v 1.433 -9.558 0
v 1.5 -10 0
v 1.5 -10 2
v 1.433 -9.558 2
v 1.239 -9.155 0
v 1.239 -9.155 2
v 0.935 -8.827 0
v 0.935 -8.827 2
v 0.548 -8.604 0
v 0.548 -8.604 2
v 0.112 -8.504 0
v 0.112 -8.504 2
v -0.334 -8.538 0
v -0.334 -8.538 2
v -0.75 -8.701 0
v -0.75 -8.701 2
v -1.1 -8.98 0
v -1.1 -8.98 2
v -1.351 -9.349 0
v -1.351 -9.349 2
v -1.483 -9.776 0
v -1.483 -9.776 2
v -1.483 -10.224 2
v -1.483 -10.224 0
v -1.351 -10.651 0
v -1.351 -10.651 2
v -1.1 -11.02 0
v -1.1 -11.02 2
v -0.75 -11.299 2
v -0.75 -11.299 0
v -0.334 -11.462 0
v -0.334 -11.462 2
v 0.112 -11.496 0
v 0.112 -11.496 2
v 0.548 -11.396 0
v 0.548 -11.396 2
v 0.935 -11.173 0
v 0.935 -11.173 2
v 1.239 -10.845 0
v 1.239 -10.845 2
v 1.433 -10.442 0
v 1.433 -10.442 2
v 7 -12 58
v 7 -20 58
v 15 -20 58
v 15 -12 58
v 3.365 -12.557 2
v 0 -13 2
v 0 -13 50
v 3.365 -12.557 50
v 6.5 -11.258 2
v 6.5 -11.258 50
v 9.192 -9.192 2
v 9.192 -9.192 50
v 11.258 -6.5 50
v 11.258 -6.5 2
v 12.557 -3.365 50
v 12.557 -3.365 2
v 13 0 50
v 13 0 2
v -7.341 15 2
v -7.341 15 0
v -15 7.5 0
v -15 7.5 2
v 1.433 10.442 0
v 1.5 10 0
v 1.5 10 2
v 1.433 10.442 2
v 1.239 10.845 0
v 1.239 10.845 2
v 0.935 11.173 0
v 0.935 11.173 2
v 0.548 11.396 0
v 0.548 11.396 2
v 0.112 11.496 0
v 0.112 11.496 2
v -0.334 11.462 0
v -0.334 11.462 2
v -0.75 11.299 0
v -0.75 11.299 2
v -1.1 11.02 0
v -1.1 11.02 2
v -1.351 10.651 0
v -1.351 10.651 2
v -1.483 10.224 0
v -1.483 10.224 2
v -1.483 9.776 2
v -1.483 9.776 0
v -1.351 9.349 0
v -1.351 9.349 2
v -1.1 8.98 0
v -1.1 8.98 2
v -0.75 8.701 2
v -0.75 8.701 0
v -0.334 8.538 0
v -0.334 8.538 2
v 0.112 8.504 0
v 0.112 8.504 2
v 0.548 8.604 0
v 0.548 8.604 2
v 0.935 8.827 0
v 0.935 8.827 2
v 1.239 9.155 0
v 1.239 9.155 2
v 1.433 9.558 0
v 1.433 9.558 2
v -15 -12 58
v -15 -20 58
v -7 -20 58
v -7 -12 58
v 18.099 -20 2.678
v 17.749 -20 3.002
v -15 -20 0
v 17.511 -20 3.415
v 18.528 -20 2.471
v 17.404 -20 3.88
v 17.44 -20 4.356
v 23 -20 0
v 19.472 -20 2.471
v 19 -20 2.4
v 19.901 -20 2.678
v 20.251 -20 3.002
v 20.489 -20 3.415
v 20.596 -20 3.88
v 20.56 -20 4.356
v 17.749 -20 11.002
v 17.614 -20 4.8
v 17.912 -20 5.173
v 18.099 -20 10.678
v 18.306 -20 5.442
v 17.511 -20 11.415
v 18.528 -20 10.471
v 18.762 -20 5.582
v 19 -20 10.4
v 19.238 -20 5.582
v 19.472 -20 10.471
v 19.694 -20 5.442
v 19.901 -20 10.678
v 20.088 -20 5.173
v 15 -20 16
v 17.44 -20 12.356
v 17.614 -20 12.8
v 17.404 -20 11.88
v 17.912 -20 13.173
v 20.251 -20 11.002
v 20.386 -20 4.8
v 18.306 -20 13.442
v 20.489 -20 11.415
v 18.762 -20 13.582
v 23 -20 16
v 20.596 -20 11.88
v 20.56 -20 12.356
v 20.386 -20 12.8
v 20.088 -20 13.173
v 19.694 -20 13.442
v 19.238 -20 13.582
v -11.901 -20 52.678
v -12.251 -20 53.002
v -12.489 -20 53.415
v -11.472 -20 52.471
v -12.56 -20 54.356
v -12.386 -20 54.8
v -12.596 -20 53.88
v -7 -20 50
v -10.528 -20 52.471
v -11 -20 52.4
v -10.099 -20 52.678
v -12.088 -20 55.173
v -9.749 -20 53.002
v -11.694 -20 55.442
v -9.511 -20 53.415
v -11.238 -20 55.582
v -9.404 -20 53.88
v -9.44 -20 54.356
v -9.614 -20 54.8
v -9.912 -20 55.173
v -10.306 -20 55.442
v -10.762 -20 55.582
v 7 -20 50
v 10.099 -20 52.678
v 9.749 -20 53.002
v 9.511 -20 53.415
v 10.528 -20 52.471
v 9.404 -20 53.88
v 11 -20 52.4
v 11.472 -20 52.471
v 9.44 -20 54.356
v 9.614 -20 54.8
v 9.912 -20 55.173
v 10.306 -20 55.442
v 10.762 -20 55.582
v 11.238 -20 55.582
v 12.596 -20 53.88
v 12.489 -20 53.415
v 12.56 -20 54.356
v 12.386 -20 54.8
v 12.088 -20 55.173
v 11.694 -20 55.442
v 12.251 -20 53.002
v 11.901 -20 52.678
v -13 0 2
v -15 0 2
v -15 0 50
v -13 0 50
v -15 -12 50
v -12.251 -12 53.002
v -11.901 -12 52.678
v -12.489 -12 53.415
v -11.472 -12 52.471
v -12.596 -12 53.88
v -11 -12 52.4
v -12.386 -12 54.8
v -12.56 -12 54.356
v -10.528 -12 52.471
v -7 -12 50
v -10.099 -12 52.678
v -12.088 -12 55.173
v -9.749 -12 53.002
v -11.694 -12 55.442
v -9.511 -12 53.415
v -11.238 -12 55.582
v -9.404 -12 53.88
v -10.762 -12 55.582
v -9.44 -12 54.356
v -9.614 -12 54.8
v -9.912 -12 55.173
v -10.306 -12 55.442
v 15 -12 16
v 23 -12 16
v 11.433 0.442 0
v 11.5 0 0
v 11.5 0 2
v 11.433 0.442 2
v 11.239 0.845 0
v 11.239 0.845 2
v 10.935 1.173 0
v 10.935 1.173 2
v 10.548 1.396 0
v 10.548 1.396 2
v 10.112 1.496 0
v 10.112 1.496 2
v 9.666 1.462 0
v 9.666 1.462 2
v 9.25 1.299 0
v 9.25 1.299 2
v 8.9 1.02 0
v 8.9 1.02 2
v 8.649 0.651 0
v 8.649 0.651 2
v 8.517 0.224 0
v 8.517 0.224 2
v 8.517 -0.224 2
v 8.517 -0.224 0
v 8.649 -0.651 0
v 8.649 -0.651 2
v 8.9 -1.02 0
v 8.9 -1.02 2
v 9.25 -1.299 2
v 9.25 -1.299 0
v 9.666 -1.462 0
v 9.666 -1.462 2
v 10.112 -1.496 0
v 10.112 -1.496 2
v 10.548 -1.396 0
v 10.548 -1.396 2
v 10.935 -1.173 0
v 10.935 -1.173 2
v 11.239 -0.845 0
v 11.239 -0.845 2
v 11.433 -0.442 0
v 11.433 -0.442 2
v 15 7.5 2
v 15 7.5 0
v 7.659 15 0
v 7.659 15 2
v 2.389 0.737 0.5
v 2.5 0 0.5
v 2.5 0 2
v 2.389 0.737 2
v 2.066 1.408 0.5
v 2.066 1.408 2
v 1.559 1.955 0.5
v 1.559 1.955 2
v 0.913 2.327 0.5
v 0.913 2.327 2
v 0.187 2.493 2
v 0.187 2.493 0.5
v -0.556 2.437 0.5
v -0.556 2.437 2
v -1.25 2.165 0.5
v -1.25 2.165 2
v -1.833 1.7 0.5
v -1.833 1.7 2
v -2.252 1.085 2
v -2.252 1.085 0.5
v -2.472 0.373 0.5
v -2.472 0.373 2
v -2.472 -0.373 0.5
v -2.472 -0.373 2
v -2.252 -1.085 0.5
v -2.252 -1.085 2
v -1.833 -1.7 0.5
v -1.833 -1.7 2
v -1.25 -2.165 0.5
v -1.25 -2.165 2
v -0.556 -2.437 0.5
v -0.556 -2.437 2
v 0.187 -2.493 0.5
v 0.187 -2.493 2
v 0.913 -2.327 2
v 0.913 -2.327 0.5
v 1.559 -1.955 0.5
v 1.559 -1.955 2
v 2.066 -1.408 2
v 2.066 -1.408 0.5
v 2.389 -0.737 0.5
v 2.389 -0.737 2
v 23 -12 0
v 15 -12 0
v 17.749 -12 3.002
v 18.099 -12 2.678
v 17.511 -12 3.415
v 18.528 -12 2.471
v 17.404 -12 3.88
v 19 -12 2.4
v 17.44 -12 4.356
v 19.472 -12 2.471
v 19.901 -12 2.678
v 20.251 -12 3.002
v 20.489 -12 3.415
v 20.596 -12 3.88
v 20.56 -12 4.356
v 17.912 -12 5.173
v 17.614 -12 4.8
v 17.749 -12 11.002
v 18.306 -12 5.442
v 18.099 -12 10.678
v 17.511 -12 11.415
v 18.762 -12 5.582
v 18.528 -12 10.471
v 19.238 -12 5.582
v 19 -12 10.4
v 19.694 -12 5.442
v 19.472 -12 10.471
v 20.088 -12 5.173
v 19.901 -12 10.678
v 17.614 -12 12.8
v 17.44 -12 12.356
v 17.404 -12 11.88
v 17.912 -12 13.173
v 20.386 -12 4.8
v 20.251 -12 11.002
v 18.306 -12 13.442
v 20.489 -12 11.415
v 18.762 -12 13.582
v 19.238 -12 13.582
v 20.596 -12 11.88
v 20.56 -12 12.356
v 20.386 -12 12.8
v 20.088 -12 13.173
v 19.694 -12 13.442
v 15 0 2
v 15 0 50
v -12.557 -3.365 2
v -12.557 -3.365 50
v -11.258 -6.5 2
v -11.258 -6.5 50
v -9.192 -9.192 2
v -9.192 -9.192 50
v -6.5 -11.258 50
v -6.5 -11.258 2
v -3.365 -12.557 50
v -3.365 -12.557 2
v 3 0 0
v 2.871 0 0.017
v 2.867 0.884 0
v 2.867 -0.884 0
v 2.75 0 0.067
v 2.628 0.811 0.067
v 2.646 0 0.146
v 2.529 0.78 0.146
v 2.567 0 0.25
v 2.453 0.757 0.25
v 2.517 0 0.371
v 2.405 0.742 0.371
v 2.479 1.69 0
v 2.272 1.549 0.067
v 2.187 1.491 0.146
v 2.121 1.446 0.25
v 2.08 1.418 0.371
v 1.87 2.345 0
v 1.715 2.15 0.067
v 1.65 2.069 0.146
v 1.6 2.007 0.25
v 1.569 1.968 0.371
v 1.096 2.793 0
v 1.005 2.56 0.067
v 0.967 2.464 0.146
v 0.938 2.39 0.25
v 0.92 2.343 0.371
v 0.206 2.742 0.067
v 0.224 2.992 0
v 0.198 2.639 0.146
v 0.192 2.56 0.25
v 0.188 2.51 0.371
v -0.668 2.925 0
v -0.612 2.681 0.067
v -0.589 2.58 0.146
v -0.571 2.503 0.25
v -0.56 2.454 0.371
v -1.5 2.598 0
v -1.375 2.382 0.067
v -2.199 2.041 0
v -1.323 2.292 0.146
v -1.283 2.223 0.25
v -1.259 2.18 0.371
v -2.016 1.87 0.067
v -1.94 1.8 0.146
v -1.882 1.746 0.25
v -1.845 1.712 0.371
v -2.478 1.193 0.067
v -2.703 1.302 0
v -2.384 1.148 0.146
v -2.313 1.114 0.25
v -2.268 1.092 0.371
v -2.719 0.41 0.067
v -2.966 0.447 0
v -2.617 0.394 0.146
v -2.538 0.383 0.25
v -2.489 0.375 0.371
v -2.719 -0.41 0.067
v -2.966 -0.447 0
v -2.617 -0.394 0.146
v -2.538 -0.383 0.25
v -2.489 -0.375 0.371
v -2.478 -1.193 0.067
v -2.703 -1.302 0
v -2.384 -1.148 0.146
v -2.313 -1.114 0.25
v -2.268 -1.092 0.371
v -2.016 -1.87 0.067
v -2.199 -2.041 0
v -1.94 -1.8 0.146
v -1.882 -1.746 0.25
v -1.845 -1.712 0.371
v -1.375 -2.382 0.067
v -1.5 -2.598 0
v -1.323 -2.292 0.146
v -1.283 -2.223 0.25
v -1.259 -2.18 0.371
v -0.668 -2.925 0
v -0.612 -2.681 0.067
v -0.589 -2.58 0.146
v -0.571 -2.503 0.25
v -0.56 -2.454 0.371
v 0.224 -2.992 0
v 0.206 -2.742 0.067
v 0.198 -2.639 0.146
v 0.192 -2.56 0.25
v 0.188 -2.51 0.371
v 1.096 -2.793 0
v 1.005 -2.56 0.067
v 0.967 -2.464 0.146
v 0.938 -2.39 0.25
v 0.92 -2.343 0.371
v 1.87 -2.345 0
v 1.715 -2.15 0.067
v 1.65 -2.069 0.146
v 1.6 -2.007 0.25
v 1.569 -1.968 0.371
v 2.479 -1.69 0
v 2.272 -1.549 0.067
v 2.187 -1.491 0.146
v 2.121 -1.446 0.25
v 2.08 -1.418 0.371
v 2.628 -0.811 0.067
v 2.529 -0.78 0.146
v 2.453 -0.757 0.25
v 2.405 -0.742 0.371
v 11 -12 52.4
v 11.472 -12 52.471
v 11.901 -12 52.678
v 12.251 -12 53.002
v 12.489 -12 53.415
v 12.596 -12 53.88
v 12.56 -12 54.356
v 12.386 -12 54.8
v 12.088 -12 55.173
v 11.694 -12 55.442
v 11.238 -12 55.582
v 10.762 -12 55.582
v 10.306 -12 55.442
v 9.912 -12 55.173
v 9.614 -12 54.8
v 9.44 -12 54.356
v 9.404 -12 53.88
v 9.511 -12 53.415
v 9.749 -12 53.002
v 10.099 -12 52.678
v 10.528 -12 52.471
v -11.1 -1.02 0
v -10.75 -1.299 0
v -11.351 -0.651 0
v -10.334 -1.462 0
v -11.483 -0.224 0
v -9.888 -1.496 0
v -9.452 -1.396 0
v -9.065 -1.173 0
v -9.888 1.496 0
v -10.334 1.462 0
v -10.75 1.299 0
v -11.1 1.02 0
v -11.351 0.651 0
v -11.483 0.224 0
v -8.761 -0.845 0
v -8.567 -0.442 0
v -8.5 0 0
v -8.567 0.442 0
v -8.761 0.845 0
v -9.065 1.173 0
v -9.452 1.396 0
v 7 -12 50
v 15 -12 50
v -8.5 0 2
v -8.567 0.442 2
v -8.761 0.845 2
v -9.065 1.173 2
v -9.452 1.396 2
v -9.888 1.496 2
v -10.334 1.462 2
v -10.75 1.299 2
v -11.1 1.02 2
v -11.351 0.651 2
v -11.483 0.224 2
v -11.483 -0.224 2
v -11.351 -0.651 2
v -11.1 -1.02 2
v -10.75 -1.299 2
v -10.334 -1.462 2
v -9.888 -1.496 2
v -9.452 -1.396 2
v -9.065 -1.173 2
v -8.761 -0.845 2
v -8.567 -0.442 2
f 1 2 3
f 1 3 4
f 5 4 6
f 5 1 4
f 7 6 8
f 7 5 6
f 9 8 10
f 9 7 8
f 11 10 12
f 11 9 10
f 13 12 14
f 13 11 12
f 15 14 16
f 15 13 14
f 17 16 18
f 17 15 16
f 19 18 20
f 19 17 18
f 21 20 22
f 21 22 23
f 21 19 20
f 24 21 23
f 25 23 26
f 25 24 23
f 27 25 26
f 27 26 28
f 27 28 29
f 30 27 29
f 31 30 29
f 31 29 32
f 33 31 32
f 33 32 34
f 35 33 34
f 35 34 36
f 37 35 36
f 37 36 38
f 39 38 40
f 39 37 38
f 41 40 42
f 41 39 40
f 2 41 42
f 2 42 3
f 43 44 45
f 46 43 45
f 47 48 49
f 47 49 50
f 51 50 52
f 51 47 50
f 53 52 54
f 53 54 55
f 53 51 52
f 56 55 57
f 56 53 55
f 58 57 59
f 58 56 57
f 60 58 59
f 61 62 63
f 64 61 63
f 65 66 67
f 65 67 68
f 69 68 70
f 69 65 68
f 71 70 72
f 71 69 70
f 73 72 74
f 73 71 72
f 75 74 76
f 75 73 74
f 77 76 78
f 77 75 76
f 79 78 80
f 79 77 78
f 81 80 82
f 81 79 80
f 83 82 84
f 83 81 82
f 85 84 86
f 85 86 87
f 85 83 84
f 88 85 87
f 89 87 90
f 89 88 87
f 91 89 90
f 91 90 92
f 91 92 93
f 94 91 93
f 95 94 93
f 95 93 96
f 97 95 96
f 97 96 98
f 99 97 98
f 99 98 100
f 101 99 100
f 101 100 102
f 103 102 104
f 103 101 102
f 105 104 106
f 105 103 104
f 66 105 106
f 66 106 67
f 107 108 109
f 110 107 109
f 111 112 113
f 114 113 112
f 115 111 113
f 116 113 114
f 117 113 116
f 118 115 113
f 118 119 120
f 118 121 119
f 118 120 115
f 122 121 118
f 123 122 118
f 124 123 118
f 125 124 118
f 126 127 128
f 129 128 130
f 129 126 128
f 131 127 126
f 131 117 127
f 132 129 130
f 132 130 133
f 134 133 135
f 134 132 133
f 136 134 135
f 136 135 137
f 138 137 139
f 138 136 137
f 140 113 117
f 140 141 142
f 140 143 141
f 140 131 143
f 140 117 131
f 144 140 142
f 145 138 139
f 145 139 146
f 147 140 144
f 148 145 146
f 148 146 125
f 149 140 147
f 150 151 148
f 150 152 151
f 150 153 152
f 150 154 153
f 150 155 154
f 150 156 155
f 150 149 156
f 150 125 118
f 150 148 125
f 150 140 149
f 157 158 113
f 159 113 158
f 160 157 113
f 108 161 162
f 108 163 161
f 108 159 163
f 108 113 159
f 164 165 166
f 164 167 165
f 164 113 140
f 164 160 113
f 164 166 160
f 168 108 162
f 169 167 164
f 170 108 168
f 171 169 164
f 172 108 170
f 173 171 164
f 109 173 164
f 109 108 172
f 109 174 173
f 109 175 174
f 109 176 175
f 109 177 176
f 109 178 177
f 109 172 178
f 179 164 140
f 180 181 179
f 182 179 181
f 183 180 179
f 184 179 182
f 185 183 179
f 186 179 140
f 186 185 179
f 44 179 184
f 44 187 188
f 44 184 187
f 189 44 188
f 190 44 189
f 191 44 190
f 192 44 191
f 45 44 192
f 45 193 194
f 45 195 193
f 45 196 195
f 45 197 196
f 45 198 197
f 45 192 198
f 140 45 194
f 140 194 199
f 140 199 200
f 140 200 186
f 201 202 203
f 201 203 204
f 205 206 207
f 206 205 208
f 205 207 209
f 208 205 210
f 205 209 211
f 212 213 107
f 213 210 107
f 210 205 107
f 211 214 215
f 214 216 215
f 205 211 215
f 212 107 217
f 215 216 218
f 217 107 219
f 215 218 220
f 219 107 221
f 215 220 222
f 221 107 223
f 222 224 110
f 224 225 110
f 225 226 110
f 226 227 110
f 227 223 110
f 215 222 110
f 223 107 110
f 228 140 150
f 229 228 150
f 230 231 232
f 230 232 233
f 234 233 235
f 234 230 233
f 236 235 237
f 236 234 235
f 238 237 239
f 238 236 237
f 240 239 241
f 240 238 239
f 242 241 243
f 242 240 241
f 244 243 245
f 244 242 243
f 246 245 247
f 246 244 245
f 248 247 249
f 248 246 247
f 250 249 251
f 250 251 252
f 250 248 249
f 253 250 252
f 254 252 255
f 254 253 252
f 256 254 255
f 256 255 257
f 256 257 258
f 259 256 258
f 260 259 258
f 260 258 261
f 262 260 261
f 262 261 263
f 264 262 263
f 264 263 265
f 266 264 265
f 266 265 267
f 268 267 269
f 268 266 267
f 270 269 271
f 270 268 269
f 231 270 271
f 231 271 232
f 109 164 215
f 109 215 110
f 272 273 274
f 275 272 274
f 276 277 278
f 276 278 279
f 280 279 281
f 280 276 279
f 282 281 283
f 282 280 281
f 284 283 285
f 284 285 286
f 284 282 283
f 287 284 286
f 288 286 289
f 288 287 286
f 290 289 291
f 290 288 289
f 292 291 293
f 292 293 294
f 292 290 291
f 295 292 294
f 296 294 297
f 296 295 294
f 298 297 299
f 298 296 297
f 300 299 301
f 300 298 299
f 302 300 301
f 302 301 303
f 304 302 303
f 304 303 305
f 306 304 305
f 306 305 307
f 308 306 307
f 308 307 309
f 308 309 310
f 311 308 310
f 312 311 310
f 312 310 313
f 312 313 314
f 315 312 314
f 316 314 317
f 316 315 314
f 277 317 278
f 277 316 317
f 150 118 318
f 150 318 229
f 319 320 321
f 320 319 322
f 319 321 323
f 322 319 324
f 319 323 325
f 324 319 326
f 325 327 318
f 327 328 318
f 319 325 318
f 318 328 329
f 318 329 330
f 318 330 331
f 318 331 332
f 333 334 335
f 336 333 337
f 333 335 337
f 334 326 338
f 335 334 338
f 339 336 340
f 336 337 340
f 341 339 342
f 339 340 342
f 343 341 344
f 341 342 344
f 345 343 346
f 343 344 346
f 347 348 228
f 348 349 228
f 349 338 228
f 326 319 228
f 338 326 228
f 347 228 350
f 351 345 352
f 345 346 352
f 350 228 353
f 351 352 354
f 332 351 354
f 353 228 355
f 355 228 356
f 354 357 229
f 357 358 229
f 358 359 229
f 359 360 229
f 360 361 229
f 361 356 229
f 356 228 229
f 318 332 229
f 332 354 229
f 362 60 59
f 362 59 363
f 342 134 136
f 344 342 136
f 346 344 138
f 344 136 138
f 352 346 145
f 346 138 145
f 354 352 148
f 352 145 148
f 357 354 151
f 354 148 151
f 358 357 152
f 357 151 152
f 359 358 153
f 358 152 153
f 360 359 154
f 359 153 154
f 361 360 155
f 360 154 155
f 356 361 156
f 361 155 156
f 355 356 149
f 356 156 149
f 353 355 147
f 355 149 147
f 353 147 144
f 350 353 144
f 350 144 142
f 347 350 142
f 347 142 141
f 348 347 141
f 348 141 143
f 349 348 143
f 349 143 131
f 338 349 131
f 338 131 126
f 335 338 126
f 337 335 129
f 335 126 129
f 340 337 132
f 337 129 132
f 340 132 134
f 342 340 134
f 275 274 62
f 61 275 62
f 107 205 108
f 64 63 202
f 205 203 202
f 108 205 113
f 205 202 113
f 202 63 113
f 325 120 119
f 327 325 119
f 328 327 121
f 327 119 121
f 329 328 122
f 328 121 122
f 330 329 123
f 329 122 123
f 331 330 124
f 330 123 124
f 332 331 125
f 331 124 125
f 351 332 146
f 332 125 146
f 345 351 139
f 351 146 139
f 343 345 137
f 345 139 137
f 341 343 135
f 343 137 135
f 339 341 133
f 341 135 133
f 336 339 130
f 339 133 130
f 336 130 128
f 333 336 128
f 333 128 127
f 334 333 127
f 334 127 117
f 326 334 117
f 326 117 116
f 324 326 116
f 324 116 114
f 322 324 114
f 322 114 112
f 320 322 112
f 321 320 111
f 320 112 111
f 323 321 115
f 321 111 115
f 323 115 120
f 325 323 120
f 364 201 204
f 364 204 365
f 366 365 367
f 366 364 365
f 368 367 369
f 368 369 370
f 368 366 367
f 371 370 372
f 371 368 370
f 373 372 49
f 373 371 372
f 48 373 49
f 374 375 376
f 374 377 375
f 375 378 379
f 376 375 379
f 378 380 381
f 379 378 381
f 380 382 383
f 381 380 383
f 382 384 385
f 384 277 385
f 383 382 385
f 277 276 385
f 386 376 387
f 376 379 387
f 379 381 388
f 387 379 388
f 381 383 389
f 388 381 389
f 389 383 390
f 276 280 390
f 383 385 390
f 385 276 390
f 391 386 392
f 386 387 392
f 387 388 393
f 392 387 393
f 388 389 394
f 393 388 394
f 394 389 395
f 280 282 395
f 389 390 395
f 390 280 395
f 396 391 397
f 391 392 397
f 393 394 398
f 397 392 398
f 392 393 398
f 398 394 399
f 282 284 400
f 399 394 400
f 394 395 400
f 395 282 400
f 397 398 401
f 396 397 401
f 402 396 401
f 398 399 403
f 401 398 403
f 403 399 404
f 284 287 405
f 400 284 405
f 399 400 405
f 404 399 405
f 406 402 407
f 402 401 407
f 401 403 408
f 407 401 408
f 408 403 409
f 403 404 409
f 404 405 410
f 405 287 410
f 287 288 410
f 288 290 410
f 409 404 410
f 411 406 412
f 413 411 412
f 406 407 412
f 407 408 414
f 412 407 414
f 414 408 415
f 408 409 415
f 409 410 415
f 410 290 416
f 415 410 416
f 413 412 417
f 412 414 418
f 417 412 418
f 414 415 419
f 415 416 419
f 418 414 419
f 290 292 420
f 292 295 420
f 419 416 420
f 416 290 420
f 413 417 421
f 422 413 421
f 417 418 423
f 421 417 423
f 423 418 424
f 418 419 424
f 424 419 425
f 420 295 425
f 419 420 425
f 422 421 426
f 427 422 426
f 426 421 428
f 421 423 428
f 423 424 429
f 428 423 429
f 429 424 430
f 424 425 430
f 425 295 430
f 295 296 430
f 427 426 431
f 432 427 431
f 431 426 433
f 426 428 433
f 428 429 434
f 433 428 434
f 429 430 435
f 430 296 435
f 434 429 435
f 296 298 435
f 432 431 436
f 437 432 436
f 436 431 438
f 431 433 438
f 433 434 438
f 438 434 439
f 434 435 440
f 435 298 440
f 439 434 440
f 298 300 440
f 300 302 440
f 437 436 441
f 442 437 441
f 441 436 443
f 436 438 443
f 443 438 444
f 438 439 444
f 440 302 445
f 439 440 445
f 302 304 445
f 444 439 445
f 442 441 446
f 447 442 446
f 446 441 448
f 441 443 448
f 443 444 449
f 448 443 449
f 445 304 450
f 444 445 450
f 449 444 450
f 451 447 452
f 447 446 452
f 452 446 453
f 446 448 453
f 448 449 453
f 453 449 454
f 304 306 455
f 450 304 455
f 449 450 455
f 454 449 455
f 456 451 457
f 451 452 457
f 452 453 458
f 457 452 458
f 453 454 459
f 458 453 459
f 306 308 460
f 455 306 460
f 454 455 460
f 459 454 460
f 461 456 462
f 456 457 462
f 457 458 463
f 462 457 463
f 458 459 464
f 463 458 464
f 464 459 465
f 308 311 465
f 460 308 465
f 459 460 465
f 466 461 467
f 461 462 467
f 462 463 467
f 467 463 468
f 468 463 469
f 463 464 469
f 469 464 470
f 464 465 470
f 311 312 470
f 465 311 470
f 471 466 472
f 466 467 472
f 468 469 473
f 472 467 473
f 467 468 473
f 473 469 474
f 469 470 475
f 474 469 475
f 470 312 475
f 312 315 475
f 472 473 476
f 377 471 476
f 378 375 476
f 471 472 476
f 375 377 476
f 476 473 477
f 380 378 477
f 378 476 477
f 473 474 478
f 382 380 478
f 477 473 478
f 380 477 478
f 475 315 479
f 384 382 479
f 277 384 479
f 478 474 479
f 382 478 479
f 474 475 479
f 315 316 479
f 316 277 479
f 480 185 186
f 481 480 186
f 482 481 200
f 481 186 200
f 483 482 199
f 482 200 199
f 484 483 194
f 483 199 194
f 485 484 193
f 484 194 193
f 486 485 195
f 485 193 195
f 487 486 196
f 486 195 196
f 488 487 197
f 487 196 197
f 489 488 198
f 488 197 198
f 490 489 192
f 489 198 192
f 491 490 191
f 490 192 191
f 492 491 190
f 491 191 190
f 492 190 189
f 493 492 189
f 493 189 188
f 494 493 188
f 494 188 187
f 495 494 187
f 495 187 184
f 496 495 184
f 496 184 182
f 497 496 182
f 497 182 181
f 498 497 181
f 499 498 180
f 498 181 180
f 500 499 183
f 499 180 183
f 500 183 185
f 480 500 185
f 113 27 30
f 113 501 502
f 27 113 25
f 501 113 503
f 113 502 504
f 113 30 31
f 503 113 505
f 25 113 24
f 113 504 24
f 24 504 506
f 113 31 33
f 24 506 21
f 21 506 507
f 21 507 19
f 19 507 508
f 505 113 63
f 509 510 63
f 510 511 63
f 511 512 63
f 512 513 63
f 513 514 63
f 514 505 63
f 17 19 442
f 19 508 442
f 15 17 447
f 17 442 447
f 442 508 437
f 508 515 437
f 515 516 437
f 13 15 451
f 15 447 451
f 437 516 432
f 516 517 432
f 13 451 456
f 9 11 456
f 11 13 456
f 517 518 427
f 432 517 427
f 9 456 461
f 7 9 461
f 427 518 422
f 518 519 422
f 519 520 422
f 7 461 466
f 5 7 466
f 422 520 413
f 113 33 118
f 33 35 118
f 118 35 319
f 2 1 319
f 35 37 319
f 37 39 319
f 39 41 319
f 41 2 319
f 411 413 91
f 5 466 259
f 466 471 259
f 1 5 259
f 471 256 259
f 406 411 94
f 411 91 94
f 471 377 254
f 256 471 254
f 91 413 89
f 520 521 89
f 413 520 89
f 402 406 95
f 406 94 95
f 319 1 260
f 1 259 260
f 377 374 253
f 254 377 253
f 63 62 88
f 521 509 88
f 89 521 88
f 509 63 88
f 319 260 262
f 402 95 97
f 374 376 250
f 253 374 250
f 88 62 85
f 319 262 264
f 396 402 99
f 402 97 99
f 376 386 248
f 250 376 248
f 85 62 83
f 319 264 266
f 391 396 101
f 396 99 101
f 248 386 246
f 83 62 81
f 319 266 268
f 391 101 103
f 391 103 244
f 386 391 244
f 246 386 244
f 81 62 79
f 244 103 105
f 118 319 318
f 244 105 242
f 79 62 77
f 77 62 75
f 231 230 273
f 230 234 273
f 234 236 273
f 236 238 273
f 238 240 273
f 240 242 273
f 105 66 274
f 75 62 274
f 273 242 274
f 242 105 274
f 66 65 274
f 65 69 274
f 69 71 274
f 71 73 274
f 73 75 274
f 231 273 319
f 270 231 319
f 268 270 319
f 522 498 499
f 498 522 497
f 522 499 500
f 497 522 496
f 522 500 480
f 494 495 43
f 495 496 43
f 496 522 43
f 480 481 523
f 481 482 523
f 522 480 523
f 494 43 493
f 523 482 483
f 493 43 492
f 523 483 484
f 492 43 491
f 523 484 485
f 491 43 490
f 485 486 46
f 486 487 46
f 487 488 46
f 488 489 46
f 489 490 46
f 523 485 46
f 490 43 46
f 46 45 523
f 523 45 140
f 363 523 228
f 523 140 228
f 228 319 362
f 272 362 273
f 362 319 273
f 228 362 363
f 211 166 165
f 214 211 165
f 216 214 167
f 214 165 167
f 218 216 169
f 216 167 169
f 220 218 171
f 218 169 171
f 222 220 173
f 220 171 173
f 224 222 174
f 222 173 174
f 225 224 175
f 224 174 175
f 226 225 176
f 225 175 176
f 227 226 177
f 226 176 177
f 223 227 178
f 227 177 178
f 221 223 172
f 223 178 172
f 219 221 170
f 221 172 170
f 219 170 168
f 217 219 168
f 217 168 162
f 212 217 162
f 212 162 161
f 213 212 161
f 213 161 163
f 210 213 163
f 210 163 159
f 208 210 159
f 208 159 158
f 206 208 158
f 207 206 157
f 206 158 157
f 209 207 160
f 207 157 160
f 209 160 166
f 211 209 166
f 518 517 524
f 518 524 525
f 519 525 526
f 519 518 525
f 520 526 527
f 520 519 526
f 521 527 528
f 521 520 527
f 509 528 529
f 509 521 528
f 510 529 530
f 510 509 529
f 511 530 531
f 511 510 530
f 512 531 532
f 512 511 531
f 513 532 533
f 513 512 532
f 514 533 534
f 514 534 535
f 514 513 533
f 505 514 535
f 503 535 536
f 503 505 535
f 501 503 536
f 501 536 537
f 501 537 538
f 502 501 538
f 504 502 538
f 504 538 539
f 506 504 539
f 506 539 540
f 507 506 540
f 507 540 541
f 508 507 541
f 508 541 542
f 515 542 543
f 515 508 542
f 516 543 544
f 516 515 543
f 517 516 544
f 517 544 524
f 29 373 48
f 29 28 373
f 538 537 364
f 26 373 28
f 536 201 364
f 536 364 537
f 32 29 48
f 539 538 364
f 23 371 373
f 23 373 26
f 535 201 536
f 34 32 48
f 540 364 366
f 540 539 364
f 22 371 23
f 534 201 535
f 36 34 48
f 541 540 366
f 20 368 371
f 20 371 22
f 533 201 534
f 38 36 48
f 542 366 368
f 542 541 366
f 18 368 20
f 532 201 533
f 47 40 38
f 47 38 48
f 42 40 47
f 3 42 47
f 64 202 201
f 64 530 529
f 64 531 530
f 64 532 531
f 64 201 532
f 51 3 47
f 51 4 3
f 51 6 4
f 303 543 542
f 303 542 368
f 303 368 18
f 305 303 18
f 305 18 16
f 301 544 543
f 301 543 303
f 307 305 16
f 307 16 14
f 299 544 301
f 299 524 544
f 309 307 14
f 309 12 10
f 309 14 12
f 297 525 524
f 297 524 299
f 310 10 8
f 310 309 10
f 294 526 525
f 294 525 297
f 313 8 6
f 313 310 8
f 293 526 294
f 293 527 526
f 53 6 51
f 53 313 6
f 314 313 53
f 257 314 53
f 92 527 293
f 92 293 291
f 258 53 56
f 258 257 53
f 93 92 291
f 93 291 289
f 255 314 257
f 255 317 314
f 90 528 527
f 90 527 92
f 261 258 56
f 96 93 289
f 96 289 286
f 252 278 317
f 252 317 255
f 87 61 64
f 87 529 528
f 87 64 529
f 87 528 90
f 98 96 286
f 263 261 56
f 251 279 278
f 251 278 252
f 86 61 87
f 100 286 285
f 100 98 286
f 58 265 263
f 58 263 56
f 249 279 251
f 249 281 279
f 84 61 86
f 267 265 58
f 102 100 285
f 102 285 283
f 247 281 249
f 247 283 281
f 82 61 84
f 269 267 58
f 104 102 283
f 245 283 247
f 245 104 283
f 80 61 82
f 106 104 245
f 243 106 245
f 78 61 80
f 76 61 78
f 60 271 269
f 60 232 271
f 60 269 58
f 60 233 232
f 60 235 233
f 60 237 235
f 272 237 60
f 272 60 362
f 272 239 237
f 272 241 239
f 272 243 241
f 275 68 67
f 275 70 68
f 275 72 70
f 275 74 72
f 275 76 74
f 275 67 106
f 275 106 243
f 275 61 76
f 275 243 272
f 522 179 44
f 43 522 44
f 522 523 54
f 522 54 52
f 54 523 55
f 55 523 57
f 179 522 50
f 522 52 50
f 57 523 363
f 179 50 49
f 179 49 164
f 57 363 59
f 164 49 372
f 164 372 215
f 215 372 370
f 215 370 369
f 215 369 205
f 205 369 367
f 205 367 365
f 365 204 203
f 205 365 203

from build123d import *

# Parameters (mm, degrees)
ESQUISSE1_R        = 1.5
ESQUISSE1_R_2      = 2.5
BOSS_EXTRU_1_DEPTH = 2
BOSS_EXTRU_2_DEPTH = 50
CONG_1_R           = 0.5
ESQUISSE3_W        = 8
ESQUISSE3_H        = 8
ESQUISSE3_R        = 1.6
BOSS_EXTRU_4_DEPTH = 8


with BuildPart() as part:
    # Esquisse1 → Boss.-Extru.1 (new body)
    with BuildSketch(Plane.XY):
        with BuildLine():
            Line((-7.341000528, 15), (-15, 7.5))
            Line((-15, 7.5), (-15, 0))
            Line((-15, 0), (-13, 0))
            ThreePointArc((-13, 0), (0, -13), (13, 0))
            Line((13, 0), (15, 0))
            Line((15, 0), (15, 7.5))
            Line((15, 7.5), (7.658999472, 15))
            Line((7.658999472, 15), (-7.341000528, 15))
        make_face()
        with Locations((0, 10)):
            Circle(ESQUISSE1_R, mode=Mode.SUBTRACT)
        with Locations((-10, 0)):
            Circle(ESQUISSE1_R, mode=Mode.SUBTRACT)
        with Locations((0, -10)):
            Circle(ESQUISSE1_R, mode=Mode.SUBTRACT)
        Circle(ESQUISSE1_R_2, mode=Mode.SUBTRACT)
        with Locations((10, 0)):
            Circle(ESQUISSE1_R, mode=Mode.SUBTRACT)
    extrude(amount=BOSS_EXTRU_1_DEPTH)

    # Esquisse2 → Boss.-Extru.2 (add)
    with BuildSketch(Plane(origin=(0, 0, 0), x_dir=(-1, 0, 0), z_dir=(0, 0, -1))):
        with BuildLine():
            ThreePointArc((13, 0), (9.192388155, -9.192388155), (0, -13))
            Line((0, -13), (0, -15))
            ThreePointArc((0, -15), (10.606601718, -10.606601718), (15, 0))
            Line((15, 0), (13, 0))
        make_face()
        with BuildLine():
            Line((0, -15), (0, -13))
            ThreePointArc((0, -13), (-9.192388155, -9.192388155), (-13, 0))
            Line((-13, 0), (-15, 0))
            ThreePointArc((-15, 0), (-10.606601718, -10.606601718), (0, -15))
        make_face()
        with BuildLine():
            Line((0, -20), (0, -15))
            ThreePointArc((0, -15), (-10.606601718, -10.606601718), (-15, 0))
            Line((-15, 0), (-15, -20))
            Line((-15, -20), (0, -20))
        make_face()
        with BuildLine():
            ThreePointArc((15, 0), (10.606601718, -10.606601718), (0, -15))
            Line((0, -15), (0, -20))
            Line((0, -20), (15, -20))
            Line((15, -20), (15, 0))
        make_face()
    extrude(amount=-BOSS_EXTRU_2_DEPTH)

    # Congé1
    cong_1_edges = [part.edges().sort_by_distance(p)[0] for p in [
        (-2.5, 0, 0),
    ]]
    fillet(cong_1_edges, radius=CONG_1_R)

    # Esquisse3 → Boss.-Extru.4 (add)
    # profile 1 of 4: a face of its own
    with BuildSketch(Plane.XZ.offset(20)):
        with Locations((19, 12)):
            Rectangle(ESQUISSE3_W, ESQUISSE3_H)
        with Locations(Location((19, 12, 0), (0, 0, 270))):
            Circle(ESQUISSE3_R, mode=Mode.SUBTRACT)
    # profile 2 of 4: a face of its own
    with BuildSketch(Plane.XZ.offset(20)):
        with Locations((19, 4)):
            Rectangle(ESQUISSE3_W, ESQUISSE3_H)
        with Locations(Location((19, 4, 0), (0, 0, 270))):
            Circle(ESQUISSE3_R, mode=Mode.SUBTRACT)
    # profile 3 of 4: a face of its own
    with BuildSketch(Plane.XZ.offset(20)):
        with Locations((11, 54)):
            Rectangle(ESQUISSE3_W, ESQUISSE3_H)
        with Locations(Location((11, 54, 0), (0, 0, 270))):
            Circle(ESQUISSE3_R, mode=Mode.SUBTRACT)
    # profile 4 of 4: a face of its own
    with BuildSketch(Plane.XZ.offset(20)):
        with Locations((-11, 54)):
            Rectangle(ESQUISSE3_W, ESQUISSE3_H)
        with Locations(Location((-11, 54, 0), (0, 0, 270))):
            Circle(ESQUISSE3_R, mode=Mode.SUBTRACT)
    extrude(amount=-BOSS_EXTRU_4_DEPTH)


solid = part.part
